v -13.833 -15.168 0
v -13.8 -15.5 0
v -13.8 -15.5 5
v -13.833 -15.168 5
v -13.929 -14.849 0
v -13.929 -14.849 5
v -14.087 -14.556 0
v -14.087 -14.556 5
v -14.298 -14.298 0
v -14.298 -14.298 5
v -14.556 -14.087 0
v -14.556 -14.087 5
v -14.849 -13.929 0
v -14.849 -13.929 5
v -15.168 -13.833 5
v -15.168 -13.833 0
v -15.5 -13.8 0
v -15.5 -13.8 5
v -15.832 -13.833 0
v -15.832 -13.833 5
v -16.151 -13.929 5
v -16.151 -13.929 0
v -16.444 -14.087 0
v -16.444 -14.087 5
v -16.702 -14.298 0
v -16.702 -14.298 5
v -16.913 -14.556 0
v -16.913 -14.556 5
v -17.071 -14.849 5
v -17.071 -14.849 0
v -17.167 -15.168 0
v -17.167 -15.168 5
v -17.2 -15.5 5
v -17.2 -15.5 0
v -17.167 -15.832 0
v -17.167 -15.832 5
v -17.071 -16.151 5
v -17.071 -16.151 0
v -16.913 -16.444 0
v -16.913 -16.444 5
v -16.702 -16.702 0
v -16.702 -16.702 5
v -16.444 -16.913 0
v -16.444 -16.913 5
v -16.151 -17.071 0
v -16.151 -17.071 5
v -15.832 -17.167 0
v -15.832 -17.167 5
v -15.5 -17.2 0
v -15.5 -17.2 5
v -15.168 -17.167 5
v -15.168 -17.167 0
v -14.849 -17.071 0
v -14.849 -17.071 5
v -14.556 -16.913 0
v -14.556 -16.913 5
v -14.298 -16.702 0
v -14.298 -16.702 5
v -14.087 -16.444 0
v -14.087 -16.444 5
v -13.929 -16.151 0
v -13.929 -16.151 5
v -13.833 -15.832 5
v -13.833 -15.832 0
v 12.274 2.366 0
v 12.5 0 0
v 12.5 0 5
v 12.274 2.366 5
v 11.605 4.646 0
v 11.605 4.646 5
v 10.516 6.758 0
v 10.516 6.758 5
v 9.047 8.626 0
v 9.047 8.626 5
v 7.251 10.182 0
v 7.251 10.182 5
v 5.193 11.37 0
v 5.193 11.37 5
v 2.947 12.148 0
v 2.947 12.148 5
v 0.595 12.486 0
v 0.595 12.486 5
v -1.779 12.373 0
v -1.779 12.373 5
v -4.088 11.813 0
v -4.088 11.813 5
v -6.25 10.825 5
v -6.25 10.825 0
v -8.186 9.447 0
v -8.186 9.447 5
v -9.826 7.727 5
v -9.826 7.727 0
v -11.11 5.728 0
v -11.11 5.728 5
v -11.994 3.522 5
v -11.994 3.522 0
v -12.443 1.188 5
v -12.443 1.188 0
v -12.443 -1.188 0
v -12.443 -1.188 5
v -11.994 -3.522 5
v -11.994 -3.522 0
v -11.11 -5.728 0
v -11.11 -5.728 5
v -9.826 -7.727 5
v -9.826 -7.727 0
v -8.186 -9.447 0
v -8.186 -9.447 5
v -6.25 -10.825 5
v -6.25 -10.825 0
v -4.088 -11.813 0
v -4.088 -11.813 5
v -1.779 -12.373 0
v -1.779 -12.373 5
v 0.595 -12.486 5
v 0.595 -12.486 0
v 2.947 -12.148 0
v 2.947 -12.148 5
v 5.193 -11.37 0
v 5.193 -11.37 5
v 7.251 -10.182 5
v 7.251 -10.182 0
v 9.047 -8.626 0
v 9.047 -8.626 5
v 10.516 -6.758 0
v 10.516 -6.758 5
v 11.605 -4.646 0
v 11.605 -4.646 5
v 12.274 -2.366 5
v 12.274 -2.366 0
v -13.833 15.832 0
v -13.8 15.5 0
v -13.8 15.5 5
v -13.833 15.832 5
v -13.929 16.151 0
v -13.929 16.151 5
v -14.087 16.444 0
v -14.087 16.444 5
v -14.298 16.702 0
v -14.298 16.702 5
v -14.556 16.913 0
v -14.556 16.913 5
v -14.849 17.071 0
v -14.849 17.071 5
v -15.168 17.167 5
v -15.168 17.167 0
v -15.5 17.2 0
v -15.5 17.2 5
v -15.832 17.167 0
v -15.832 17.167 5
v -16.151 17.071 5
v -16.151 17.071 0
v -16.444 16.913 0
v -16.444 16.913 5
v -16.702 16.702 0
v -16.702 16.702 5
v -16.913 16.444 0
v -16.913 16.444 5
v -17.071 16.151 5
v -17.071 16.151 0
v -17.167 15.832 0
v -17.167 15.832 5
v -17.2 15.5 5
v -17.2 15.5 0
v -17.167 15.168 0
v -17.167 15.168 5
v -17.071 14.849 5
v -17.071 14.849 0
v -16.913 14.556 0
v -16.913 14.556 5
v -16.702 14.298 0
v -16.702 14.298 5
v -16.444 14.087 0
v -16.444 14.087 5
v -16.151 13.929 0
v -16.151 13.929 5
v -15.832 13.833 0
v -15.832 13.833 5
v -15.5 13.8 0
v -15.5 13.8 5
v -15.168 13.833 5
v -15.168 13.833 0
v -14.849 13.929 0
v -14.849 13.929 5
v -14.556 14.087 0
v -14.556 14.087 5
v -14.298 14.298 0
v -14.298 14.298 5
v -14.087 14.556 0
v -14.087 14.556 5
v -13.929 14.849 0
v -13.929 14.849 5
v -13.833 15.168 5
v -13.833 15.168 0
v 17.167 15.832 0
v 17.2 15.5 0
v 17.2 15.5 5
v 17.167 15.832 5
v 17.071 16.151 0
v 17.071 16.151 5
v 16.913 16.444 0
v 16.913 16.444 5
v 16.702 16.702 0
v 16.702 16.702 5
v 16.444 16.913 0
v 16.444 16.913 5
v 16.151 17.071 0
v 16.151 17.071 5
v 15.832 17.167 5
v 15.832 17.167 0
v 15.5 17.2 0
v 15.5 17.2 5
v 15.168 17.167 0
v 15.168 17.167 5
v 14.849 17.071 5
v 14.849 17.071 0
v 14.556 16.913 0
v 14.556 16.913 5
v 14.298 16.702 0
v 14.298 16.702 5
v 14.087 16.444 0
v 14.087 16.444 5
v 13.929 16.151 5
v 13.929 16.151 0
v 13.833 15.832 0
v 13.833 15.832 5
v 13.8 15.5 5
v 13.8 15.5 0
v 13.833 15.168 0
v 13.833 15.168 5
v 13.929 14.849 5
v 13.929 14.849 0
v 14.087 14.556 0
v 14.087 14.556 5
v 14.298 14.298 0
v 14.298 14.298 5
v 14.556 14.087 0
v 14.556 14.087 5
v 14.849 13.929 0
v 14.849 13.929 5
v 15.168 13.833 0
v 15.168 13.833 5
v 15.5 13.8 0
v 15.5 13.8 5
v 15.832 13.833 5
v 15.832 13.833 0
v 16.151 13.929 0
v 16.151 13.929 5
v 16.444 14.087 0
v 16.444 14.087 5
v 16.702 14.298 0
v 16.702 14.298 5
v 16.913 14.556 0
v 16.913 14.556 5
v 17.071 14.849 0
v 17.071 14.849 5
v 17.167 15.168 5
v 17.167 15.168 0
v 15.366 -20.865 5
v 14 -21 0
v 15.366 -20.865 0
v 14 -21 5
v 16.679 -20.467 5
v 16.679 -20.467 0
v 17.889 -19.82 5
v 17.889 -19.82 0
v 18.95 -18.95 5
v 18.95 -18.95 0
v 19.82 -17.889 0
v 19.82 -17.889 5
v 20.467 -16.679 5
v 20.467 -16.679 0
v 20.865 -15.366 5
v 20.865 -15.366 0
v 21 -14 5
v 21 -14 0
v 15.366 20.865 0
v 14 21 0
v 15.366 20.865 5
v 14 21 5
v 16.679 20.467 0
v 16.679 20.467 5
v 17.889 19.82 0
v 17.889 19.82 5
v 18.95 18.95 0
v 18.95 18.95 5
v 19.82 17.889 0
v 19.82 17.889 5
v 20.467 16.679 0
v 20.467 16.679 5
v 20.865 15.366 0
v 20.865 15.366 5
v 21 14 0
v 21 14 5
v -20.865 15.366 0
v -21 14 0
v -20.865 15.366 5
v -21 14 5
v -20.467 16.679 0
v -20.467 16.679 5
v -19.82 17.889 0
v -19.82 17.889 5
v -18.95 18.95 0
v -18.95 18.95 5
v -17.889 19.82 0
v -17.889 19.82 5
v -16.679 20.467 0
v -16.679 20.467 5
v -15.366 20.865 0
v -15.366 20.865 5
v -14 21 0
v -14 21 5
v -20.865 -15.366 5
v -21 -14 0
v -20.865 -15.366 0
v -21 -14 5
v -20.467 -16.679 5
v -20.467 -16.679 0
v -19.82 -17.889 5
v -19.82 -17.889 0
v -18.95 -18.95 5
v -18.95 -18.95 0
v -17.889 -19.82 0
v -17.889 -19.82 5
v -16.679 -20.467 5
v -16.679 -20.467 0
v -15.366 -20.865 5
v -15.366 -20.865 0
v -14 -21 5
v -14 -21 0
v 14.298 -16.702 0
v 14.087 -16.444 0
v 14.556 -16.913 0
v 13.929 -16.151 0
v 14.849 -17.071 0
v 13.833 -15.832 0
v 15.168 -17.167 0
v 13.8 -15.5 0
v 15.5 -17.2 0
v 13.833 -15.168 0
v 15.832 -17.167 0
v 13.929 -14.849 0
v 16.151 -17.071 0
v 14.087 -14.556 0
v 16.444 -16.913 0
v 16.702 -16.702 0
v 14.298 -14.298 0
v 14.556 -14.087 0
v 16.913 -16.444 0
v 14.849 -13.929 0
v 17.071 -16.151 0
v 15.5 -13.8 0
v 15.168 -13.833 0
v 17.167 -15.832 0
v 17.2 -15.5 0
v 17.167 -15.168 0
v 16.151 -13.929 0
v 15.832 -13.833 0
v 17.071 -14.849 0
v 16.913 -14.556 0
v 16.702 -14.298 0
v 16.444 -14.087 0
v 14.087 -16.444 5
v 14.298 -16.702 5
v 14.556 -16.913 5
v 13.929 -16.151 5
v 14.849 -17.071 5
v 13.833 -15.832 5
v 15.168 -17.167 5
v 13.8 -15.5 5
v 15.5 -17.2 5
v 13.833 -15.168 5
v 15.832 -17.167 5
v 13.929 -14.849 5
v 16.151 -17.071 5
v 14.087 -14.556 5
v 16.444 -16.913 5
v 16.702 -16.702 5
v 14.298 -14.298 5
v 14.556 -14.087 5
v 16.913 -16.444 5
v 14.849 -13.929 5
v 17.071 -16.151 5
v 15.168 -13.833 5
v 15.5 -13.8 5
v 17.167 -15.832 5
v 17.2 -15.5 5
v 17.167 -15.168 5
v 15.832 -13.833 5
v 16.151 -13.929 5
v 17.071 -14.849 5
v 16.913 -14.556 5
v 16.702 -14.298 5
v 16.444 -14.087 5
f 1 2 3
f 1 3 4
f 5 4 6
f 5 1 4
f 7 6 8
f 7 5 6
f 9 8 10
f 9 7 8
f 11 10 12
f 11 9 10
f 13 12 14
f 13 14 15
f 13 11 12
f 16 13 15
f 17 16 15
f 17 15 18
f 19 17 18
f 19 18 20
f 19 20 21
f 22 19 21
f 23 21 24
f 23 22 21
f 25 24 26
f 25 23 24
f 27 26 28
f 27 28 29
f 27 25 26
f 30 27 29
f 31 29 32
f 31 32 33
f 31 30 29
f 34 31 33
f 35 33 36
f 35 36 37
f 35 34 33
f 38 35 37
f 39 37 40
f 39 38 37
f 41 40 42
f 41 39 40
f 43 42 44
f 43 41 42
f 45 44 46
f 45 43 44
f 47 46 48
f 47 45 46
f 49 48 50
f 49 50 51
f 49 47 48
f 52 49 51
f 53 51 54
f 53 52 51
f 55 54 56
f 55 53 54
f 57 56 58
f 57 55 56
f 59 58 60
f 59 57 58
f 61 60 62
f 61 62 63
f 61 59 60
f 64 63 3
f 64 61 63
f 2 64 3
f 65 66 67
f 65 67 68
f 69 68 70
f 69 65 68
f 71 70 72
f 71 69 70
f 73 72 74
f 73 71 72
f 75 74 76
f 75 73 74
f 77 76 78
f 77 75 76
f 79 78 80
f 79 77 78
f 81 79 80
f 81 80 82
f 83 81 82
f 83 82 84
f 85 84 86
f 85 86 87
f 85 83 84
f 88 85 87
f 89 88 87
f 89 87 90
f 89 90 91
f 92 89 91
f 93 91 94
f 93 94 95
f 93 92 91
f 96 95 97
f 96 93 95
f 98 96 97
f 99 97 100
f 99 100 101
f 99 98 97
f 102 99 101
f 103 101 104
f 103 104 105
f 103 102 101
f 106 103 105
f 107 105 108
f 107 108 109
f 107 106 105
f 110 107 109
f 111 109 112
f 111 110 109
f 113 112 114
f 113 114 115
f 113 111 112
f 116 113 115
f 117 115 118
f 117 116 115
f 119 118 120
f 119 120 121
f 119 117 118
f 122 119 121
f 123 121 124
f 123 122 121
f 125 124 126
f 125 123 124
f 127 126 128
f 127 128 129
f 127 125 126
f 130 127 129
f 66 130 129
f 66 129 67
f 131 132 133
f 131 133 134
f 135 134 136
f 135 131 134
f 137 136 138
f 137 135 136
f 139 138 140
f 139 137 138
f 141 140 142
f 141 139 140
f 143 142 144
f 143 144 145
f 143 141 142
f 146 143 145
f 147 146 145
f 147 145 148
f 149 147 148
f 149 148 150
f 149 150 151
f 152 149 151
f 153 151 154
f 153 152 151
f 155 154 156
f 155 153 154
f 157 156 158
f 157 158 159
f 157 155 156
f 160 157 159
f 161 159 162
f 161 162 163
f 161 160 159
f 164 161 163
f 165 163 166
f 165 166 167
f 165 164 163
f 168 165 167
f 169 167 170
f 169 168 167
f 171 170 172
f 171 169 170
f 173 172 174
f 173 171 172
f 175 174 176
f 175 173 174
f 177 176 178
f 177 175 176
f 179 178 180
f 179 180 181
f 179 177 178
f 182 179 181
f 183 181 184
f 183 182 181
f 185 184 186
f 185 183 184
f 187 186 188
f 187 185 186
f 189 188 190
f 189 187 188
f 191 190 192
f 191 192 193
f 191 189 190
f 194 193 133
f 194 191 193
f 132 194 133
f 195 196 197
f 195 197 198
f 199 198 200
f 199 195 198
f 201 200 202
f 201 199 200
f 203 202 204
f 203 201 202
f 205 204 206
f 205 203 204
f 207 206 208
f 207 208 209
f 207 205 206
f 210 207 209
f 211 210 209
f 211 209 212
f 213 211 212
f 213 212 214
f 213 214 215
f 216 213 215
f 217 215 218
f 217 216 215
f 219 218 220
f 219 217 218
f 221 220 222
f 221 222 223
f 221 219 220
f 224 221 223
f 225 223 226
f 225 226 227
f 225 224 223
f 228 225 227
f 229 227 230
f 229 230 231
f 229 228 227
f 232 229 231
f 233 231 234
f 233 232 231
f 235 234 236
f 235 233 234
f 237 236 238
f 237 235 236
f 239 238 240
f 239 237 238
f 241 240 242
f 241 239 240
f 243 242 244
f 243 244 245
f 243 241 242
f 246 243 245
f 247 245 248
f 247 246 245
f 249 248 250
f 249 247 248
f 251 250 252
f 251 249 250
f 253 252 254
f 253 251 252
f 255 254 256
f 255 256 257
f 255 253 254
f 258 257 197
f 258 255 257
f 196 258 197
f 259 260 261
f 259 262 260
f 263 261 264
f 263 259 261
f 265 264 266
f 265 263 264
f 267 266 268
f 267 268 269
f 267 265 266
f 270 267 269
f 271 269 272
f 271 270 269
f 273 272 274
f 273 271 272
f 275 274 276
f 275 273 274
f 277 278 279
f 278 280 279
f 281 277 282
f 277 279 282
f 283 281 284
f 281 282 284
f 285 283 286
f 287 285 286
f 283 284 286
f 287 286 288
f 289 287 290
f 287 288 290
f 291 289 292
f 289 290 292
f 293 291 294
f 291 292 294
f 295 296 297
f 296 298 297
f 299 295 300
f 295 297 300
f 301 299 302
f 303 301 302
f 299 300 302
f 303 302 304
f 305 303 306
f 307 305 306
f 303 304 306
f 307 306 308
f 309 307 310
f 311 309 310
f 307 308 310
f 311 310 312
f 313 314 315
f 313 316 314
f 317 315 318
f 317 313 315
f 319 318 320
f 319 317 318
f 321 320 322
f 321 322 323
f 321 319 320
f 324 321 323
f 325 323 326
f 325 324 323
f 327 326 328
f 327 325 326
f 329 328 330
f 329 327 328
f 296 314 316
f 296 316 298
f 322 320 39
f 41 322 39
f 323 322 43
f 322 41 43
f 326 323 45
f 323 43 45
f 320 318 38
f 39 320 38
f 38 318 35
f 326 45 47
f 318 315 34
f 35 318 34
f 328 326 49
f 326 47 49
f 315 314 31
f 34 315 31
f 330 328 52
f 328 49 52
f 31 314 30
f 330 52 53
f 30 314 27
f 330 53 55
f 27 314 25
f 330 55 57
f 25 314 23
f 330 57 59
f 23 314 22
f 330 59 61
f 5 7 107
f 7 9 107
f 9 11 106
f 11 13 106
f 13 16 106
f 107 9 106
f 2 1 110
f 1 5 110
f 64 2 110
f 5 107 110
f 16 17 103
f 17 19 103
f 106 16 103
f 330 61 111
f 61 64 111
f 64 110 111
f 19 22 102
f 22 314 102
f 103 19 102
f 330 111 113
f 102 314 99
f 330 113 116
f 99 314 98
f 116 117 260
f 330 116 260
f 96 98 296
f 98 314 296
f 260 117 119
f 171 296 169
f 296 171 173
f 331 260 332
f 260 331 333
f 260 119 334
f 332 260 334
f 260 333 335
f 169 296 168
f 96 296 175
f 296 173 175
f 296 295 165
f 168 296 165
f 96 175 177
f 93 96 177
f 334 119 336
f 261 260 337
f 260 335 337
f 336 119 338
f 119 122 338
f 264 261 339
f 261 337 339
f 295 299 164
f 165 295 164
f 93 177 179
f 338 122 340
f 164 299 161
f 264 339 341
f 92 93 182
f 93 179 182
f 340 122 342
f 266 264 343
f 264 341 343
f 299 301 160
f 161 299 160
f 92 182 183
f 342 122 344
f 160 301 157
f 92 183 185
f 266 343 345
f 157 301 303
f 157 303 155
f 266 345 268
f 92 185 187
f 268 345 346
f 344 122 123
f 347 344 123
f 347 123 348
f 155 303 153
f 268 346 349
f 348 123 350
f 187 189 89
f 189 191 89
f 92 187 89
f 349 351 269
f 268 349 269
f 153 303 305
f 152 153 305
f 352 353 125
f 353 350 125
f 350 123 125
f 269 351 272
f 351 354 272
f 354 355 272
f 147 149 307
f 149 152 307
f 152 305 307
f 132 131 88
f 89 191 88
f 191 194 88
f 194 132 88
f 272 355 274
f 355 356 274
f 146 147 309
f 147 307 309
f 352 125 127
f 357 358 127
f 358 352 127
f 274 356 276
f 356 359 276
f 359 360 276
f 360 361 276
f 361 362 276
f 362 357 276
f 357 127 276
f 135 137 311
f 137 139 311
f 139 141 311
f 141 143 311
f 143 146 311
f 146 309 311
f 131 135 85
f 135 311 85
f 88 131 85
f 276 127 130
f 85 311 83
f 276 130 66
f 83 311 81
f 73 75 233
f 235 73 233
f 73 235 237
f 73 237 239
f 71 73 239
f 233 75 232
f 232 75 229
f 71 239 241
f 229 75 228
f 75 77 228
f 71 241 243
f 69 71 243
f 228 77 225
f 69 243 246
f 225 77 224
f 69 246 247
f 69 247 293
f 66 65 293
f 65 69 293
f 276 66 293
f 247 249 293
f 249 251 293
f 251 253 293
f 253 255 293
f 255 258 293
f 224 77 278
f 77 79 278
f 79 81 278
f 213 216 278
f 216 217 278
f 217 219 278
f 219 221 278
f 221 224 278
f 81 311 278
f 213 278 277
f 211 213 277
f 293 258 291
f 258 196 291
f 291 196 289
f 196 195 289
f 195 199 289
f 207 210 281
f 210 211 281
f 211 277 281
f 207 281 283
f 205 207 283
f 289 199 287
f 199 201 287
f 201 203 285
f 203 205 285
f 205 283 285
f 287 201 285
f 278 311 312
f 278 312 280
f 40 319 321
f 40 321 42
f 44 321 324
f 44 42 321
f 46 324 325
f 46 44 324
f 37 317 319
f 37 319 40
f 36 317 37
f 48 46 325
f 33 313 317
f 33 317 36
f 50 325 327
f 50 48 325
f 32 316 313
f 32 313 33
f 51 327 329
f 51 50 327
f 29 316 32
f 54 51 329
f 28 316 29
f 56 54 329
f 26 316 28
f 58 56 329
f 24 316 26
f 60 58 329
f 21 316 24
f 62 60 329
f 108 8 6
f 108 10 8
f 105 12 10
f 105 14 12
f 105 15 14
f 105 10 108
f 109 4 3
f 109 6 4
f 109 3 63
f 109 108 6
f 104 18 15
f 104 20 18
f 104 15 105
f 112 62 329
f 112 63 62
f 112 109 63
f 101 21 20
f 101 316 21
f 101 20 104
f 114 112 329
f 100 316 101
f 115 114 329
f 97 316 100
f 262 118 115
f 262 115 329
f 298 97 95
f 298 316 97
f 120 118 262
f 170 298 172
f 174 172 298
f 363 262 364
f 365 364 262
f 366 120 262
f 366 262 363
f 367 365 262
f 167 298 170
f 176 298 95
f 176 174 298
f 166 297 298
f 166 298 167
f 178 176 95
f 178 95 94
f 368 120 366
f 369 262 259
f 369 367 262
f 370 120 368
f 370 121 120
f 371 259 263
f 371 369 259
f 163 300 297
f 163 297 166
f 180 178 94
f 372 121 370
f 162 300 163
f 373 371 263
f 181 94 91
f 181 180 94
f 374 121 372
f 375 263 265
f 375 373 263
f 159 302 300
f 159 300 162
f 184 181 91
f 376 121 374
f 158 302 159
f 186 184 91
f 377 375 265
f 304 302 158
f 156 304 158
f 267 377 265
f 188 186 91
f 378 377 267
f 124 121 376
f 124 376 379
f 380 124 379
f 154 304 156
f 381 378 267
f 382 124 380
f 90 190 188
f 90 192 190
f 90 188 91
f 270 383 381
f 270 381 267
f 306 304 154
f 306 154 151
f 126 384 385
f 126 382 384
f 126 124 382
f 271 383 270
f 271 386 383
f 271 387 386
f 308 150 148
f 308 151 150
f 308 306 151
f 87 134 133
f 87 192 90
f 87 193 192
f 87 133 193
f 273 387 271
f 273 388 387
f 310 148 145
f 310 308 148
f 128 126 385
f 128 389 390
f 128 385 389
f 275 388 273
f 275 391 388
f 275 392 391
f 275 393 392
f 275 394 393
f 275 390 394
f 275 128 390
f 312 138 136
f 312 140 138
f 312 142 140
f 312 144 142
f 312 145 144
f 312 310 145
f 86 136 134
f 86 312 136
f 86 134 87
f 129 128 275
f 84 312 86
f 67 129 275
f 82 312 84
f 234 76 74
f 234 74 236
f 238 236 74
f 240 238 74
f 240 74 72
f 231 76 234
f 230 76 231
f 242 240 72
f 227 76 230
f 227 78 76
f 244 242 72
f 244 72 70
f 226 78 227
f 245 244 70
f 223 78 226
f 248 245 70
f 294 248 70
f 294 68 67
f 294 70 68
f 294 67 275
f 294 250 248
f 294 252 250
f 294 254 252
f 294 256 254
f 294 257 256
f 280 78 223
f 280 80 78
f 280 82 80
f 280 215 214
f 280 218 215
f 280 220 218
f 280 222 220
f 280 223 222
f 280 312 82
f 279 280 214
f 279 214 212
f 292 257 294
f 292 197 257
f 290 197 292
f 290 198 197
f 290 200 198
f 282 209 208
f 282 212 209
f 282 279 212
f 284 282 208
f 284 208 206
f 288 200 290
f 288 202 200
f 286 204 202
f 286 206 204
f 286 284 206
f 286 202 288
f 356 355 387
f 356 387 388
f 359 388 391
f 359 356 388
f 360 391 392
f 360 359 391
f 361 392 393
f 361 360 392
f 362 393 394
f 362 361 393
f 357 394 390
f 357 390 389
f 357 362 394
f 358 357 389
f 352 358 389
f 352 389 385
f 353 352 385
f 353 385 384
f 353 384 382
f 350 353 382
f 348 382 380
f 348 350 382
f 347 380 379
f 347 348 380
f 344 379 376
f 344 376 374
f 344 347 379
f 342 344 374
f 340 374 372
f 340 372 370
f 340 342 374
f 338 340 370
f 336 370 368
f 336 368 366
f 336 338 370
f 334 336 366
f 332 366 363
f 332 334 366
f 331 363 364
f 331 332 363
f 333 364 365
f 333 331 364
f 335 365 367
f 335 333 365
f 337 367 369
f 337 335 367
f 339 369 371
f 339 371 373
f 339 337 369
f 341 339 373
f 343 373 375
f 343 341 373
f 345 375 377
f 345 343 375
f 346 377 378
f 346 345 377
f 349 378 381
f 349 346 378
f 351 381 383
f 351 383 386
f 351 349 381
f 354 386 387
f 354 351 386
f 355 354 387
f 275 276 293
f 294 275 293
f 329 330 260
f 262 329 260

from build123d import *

# Parameters (mm, degrees)
SKETCH_1_W      = 42
SKETCH_1_H      = 42
SKETCH_1_R      = 12.5
SKETCH_1_R_2    = 1.7
EXTRUDE_1_DEPTH = 5
FILLET_1_R      = 7


with BuildPart() as part:
    # 草图1 → 凸台-拉伸1 (new body)
    with BuildSketch(Plane.XY):
        Rectangle(SKETCH_1_W, SKETCH_1_H)
        Circle(SKETCH_1_R, mode=Mode.SUBTRACT)
        with Locations((-15.5, -15.5)):
            Circle(SKETCH_1_R_2, mode=Mode.SUBTRACT)
        with Locations((15.5, -15.5)):
            Circle(SKETCH_1_R_2, mode=Mode.SUBTRACT)
        with Locations((15.5, 15.5)):
            Circle(SKETCH_1_R_2, mode=Mode.SUBTRACT)
        with Locations((-15.5, 15.5)):
            Circle(SKETCH_1_R_2, mode=Mode.SUBTRACT)
    extrude(amount=EXTRUDE_1_DEPTH)

    # 圆角1
    fillet_1_edges = [part.edges().sort_by_distance(p)[0] for p in [
        (21, -21, 2.5),
        (-21, -21, 2.5),
        (-21, 21, 2.5),
        (21, 21, 2.5),
    ]]
    fillet(fillet_1_edges, radius=FILLET_1_R)


solid = part.part
